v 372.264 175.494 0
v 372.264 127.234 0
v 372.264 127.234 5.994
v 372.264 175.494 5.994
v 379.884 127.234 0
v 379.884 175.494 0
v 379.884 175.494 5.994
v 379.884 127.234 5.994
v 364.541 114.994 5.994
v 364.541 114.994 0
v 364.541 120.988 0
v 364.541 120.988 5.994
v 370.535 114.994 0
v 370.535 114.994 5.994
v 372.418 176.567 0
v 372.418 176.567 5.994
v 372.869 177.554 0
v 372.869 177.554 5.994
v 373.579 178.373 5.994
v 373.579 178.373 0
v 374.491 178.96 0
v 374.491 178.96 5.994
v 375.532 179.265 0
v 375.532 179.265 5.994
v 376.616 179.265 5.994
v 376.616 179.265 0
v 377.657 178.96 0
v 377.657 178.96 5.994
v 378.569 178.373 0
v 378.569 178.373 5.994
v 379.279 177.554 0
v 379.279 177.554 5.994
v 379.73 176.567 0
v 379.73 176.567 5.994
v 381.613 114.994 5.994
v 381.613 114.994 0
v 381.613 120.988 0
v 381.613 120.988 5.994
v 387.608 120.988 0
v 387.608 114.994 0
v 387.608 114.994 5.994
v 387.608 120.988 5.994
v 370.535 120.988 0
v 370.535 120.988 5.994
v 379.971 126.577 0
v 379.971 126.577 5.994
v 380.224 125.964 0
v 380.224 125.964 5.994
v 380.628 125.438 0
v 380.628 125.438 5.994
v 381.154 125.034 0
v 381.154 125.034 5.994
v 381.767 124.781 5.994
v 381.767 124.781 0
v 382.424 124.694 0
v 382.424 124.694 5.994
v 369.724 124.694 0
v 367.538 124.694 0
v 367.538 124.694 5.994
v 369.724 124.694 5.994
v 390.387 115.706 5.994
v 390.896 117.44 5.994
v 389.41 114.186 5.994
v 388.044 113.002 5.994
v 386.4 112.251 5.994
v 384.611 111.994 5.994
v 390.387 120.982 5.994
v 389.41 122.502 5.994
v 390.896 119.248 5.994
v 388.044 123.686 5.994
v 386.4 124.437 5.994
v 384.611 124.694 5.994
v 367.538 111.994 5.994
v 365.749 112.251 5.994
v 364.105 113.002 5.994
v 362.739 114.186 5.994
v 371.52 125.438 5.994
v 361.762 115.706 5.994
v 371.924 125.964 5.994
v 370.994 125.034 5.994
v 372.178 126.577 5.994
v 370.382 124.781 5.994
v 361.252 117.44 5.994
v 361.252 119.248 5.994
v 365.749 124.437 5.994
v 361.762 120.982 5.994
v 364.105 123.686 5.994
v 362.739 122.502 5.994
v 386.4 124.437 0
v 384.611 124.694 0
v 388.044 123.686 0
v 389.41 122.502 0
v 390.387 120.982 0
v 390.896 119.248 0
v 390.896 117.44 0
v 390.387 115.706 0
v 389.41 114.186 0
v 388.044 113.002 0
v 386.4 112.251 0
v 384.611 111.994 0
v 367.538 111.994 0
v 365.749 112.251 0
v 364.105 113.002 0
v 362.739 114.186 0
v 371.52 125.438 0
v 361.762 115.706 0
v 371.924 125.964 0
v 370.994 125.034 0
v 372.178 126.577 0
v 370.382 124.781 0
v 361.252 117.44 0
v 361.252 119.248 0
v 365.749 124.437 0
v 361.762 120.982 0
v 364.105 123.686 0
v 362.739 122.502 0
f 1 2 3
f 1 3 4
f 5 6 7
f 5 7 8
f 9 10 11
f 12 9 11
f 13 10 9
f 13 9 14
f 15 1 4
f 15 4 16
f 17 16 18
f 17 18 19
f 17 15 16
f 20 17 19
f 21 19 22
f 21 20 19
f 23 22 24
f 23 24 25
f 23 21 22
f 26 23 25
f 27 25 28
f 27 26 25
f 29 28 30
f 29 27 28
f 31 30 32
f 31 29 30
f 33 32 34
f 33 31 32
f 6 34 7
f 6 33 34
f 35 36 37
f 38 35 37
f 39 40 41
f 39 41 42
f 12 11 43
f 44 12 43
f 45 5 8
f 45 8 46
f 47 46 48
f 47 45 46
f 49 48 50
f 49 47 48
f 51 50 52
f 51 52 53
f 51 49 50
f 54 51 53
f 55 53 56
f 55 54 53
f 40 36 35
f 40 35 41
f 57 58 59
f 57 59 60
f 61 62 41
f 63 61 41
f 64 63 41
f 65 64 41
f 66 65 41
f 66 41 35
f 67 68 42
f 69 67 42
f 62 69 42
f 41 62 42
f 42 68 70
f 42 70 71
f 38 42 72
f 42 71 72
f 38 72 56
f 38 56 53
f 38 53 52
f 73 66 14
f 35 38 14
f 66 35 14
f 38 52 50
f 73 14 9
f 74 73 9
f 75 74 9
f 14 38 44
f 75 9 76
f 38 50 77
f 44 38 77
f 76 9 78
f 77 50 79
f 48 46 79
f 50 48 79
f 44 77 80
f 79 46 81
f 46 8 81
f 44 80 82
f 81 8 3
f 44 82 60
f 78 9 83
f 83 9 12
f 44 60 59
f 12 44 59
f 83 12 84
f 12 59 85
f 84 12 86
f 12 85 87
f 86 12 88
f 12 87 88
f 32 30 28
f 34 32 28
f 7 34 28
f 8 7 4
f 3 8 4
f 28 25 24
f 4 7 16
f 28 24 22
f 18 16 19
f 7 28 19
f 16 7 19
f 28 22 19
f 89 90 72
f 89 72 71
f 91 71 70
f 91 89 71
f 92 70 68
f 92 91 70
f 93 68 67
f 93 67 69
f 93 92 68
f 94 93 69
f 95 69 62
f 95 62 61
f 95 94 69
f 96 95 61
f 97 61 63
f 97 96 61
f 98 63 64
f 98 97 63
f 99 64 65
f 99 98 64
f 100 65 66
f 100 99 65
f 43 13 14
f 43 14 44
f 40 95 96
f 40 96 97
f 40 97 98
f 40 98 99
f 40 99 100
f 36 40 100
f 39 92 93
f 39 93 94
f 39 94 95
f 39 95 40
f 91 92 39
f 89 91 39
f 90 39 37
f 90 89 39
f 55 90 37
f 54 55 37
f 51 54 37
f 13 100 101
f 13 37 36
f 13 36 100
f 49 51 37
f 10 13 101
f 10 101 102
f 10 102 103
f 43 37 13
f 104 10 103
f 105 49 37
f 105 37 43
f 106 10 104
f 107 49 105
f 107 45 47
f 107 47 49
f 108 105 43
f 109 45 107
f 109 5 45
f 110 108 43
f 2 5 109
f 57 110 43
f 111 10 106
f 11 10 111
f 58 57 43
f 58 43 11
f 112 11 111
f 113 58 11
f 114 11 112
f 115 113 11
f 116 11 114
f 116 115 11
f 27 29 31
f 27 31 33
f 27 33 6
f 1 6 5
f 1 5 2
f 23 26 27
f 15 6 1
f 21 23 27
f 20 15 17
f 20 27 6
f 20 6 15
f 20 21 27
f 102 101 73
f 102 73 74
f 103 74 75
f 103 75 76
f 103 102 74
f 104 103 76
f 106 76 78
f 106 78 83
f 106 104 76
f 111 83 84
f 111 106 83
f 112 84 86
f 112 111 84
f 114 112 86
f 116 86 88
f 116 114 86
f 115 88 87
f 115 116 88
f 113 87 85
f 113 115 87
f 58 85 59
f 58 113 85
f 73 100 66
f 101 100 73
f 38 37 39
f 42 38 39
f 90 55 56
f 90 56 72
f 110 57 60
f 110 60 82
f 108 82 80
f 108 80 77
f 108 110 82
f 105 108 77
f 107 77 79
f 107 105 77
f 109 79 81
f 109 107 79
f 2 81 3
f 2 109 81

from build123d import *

# Parameters (mm, degrees)
SKETCH1_W           = 5.9944
SKETCH1_H           = 5.9944
BOSS_EXTRUDE1_DEPTH = 5.9944


with BuildPart() as part:
    # Sketch1 → Boss-Extrude1 (new body)
    with BuildSketch(Plane.XY):
        with BuildLine():
            Line((384.610540851, 111.993994152), (367.537765391, 111.993994152))
            ThreePointArc((367.537765391, 111.993994152), (361.187765391, 118.343994152), (367.537765391, 124.693994152))
            Line((367.537765391, 124.693994152), (369.724153121, 124.693994152))
            ThreePointArc((369.724153121, 124.693994152), (371.520204345, 125.437942928), (372.264153121, 127.233994152))
            Line((372.264153121, 127.233994152), (372.264153121, 175.493994152))
            ThreePointArc((372.264153121, 175.493994152), (376.074153121, 179.303994152), (379.884153121, 175.493994152))
            Line((379.884153121, 175.493994152), (379.884153121, 127.233994152))
            ThreePointArc((379.884153121, 127.233994152), (380.628101897, 125.437942928), (382.424153121, 124.693994152))
            Line((382.424153121, 124.693994152), (384.610540851, 124.693994152))
            ThreePointArc((384.610540851, 124.693994152), (390.960540851, 118.343994152), (384.610540851, 111.993994152))
        make_face()
        with Locations((384.610540851, 117.991248441)):
            Rectangle(SKETCH1_W, SKETCH1_H, mode=Mode.SUBTRACT)
        with Locations((367.537765391, 117.991248441)):
            Rectangle(SKETCH1_W, SKETCH1_H, mode=Mode.SUBTRACT)
    extrude(amount=BOSS_EXTRUDE1_DEPTH)


solid = part.part
